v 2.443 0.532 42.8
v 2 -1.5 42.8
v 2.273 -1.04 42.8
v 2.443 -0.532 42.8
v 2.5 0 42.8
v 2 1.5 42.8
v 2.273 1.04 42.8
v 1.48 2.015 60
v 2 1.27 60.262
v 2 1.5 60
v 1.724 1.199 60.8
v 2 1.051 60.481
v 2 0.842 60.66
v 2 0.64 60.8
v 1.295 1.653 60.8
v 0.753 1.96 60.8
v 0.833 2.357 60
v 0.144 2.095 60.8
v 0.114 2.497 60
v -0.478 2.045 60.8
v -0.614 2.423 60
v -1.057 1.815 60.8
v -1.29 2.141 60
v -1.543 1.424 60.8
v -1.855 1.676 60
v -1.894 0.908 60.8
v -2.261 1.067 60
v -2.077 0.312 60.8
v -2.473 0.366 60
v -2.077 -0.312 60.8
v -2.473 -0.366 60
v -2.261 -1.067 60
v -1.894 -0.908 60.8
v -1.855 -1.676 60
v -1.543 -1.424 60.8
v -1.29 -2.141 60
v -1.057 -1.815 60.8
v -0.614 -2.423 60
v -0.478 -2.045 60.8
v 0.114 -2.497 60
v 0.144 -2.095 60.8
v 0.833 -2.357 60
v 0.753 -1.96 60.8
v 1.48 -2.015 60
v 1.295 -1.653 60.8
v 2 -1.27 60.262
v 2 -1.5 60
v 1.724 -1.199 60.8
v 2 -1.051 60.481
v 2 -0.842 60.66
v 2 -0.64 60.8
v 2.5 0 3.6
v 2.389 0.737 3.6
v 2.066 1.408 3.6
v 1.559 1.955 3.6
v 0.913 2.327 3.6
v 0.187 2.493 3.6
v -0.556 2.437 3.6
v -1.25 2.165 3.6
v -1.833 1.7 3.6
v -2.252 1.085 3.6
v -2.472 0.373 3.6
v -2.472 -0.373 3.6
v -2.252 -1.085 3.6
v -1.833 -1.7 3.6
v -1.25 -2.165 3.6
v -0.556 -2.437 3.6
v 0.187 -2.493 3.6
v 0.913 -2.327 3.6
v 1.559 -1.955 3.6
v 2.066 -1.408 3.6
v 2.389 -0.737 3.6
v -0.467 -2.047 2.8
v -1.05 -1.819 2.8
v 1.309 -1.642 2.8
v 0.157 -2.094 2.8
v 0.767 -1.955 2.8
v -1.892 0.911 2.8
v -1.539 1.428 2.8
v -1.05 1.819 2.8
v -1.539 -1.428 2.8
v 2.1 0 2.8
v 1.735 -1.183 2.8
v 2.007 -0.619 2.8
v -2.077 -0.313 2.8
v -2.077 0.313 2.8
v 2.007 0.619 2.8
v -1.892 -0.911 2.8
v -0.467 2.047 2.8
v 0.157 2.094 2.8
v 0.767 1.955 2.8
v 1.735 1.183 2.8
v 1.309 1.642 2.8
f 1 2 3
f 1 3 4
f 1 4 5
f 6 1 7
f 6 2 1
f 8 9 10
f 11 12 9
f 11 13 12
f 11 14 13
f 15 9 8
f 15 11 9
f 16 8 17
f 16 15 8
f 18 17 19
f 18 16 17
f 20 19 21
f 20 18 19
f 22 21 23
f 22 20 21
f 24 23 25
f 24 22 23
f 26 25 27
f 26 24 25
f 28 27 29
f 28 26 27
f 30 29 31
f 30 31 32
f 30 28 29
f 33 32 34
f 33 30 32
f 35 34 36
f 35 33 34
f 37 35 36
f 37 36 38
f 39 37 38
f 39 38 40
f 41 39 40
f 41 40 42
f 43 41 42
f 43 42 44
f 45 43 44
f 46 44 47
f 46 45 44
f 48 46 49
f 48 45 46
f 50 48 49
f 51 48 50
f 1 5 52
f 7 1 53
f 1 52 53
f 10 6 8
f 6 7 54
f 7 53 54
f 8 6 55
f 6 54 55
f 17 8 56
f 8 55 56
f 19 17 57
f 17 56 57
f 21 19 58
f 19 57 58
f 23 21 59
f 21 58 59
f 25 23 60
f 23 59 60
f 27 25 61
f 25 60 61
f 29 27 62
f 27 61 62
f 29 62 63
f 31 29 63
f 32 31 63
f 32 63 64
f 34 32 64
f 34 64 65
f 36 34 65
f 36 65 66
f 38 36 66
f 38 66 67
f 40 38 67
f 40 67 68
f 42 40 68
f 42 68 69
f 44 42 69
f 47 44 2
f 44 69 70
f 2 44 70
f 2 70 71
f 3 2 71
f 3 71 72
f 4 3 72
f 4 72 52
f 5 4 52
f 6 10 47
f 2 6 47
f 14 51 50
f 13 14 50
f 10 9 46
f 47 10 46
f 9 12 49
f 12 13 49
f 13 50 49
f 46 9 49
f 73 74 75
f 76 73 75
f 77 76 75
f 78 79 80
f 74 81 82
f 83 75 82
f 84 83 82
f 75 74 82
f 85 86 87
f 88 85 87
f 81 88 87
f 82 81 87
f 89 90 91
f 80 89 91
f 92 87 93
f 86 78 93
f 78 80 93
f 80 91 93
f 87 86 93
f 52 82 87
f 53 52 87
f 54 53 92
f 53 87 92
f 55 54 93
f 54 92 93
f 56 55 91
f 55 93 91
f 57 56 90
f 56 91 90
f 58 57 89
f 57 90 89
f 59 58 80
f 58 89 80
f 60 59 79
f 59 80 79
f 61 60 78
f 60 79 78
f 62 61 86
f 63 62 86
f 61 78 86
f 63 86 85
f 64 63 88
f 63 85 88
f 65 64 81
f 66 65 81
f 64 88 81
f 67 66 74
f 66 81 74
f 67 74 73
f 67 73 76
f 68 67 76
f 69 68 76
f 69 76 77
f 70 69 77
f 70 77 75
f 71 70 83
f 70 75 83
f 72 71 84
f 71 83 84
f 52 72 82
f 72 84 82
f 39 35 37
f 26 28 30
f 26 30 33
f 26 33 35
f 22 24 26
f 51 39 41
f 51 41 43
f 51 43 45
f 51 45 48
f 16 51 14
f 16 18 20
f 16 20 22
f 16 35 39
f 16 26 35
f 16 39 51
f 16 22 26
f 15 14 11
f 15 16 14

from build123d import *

# Parameters (mm, degrees)
SKETCH039_R      = 2.5
PAD023_DEPTH     = 58
POCKET003_DEPTH  = 18
CHAMFER002_SIZE2 = 0.4
CHAMFER002_SIZE  = 0.8


with BuildPart() as part:
    # Sketch039 → Pad023 (new body)
    with BuildSketch(Plane.XY):
        Circle(SKETCH039_R)
    extrude(amount=PAD023_DEPTH)

    # Sketch040 (on Face3 of Pad023) → Pocket003 (cut)
    with BuildSketch(Plane.XY.offset(58)):
        with BuildLine():
            ThreePointArc((2, -1.5), (2.5, 0), (2, 1.5))
            Line((2, 1.5), (2, -1.5))
        make_face()
    extrude(amount=-POCKET003_DEPTH, mode=Mode.SUBTRACT)

    # Chamfer002
    chamfer002_edges = [part.edges().sort_by_distance(p)[0] for p in [
        (-2.5, 0, 58),
        (-2.5, 0, 0),
    ]]
    chamfer002_side = part.faces().sort_by_distance((-2.5, 0, 29))[0]
    chamfer(chamfer002_edges, length=CHAMFER002_SIZE, length2=CHAMFER002_SIZE2, reference=chamfer002_side)


with BuildPart() as part_1:
    # Body012 placement: moved
    add(part.part.moved(Location((0, 0, 2.8))))


solid = part_1.part
